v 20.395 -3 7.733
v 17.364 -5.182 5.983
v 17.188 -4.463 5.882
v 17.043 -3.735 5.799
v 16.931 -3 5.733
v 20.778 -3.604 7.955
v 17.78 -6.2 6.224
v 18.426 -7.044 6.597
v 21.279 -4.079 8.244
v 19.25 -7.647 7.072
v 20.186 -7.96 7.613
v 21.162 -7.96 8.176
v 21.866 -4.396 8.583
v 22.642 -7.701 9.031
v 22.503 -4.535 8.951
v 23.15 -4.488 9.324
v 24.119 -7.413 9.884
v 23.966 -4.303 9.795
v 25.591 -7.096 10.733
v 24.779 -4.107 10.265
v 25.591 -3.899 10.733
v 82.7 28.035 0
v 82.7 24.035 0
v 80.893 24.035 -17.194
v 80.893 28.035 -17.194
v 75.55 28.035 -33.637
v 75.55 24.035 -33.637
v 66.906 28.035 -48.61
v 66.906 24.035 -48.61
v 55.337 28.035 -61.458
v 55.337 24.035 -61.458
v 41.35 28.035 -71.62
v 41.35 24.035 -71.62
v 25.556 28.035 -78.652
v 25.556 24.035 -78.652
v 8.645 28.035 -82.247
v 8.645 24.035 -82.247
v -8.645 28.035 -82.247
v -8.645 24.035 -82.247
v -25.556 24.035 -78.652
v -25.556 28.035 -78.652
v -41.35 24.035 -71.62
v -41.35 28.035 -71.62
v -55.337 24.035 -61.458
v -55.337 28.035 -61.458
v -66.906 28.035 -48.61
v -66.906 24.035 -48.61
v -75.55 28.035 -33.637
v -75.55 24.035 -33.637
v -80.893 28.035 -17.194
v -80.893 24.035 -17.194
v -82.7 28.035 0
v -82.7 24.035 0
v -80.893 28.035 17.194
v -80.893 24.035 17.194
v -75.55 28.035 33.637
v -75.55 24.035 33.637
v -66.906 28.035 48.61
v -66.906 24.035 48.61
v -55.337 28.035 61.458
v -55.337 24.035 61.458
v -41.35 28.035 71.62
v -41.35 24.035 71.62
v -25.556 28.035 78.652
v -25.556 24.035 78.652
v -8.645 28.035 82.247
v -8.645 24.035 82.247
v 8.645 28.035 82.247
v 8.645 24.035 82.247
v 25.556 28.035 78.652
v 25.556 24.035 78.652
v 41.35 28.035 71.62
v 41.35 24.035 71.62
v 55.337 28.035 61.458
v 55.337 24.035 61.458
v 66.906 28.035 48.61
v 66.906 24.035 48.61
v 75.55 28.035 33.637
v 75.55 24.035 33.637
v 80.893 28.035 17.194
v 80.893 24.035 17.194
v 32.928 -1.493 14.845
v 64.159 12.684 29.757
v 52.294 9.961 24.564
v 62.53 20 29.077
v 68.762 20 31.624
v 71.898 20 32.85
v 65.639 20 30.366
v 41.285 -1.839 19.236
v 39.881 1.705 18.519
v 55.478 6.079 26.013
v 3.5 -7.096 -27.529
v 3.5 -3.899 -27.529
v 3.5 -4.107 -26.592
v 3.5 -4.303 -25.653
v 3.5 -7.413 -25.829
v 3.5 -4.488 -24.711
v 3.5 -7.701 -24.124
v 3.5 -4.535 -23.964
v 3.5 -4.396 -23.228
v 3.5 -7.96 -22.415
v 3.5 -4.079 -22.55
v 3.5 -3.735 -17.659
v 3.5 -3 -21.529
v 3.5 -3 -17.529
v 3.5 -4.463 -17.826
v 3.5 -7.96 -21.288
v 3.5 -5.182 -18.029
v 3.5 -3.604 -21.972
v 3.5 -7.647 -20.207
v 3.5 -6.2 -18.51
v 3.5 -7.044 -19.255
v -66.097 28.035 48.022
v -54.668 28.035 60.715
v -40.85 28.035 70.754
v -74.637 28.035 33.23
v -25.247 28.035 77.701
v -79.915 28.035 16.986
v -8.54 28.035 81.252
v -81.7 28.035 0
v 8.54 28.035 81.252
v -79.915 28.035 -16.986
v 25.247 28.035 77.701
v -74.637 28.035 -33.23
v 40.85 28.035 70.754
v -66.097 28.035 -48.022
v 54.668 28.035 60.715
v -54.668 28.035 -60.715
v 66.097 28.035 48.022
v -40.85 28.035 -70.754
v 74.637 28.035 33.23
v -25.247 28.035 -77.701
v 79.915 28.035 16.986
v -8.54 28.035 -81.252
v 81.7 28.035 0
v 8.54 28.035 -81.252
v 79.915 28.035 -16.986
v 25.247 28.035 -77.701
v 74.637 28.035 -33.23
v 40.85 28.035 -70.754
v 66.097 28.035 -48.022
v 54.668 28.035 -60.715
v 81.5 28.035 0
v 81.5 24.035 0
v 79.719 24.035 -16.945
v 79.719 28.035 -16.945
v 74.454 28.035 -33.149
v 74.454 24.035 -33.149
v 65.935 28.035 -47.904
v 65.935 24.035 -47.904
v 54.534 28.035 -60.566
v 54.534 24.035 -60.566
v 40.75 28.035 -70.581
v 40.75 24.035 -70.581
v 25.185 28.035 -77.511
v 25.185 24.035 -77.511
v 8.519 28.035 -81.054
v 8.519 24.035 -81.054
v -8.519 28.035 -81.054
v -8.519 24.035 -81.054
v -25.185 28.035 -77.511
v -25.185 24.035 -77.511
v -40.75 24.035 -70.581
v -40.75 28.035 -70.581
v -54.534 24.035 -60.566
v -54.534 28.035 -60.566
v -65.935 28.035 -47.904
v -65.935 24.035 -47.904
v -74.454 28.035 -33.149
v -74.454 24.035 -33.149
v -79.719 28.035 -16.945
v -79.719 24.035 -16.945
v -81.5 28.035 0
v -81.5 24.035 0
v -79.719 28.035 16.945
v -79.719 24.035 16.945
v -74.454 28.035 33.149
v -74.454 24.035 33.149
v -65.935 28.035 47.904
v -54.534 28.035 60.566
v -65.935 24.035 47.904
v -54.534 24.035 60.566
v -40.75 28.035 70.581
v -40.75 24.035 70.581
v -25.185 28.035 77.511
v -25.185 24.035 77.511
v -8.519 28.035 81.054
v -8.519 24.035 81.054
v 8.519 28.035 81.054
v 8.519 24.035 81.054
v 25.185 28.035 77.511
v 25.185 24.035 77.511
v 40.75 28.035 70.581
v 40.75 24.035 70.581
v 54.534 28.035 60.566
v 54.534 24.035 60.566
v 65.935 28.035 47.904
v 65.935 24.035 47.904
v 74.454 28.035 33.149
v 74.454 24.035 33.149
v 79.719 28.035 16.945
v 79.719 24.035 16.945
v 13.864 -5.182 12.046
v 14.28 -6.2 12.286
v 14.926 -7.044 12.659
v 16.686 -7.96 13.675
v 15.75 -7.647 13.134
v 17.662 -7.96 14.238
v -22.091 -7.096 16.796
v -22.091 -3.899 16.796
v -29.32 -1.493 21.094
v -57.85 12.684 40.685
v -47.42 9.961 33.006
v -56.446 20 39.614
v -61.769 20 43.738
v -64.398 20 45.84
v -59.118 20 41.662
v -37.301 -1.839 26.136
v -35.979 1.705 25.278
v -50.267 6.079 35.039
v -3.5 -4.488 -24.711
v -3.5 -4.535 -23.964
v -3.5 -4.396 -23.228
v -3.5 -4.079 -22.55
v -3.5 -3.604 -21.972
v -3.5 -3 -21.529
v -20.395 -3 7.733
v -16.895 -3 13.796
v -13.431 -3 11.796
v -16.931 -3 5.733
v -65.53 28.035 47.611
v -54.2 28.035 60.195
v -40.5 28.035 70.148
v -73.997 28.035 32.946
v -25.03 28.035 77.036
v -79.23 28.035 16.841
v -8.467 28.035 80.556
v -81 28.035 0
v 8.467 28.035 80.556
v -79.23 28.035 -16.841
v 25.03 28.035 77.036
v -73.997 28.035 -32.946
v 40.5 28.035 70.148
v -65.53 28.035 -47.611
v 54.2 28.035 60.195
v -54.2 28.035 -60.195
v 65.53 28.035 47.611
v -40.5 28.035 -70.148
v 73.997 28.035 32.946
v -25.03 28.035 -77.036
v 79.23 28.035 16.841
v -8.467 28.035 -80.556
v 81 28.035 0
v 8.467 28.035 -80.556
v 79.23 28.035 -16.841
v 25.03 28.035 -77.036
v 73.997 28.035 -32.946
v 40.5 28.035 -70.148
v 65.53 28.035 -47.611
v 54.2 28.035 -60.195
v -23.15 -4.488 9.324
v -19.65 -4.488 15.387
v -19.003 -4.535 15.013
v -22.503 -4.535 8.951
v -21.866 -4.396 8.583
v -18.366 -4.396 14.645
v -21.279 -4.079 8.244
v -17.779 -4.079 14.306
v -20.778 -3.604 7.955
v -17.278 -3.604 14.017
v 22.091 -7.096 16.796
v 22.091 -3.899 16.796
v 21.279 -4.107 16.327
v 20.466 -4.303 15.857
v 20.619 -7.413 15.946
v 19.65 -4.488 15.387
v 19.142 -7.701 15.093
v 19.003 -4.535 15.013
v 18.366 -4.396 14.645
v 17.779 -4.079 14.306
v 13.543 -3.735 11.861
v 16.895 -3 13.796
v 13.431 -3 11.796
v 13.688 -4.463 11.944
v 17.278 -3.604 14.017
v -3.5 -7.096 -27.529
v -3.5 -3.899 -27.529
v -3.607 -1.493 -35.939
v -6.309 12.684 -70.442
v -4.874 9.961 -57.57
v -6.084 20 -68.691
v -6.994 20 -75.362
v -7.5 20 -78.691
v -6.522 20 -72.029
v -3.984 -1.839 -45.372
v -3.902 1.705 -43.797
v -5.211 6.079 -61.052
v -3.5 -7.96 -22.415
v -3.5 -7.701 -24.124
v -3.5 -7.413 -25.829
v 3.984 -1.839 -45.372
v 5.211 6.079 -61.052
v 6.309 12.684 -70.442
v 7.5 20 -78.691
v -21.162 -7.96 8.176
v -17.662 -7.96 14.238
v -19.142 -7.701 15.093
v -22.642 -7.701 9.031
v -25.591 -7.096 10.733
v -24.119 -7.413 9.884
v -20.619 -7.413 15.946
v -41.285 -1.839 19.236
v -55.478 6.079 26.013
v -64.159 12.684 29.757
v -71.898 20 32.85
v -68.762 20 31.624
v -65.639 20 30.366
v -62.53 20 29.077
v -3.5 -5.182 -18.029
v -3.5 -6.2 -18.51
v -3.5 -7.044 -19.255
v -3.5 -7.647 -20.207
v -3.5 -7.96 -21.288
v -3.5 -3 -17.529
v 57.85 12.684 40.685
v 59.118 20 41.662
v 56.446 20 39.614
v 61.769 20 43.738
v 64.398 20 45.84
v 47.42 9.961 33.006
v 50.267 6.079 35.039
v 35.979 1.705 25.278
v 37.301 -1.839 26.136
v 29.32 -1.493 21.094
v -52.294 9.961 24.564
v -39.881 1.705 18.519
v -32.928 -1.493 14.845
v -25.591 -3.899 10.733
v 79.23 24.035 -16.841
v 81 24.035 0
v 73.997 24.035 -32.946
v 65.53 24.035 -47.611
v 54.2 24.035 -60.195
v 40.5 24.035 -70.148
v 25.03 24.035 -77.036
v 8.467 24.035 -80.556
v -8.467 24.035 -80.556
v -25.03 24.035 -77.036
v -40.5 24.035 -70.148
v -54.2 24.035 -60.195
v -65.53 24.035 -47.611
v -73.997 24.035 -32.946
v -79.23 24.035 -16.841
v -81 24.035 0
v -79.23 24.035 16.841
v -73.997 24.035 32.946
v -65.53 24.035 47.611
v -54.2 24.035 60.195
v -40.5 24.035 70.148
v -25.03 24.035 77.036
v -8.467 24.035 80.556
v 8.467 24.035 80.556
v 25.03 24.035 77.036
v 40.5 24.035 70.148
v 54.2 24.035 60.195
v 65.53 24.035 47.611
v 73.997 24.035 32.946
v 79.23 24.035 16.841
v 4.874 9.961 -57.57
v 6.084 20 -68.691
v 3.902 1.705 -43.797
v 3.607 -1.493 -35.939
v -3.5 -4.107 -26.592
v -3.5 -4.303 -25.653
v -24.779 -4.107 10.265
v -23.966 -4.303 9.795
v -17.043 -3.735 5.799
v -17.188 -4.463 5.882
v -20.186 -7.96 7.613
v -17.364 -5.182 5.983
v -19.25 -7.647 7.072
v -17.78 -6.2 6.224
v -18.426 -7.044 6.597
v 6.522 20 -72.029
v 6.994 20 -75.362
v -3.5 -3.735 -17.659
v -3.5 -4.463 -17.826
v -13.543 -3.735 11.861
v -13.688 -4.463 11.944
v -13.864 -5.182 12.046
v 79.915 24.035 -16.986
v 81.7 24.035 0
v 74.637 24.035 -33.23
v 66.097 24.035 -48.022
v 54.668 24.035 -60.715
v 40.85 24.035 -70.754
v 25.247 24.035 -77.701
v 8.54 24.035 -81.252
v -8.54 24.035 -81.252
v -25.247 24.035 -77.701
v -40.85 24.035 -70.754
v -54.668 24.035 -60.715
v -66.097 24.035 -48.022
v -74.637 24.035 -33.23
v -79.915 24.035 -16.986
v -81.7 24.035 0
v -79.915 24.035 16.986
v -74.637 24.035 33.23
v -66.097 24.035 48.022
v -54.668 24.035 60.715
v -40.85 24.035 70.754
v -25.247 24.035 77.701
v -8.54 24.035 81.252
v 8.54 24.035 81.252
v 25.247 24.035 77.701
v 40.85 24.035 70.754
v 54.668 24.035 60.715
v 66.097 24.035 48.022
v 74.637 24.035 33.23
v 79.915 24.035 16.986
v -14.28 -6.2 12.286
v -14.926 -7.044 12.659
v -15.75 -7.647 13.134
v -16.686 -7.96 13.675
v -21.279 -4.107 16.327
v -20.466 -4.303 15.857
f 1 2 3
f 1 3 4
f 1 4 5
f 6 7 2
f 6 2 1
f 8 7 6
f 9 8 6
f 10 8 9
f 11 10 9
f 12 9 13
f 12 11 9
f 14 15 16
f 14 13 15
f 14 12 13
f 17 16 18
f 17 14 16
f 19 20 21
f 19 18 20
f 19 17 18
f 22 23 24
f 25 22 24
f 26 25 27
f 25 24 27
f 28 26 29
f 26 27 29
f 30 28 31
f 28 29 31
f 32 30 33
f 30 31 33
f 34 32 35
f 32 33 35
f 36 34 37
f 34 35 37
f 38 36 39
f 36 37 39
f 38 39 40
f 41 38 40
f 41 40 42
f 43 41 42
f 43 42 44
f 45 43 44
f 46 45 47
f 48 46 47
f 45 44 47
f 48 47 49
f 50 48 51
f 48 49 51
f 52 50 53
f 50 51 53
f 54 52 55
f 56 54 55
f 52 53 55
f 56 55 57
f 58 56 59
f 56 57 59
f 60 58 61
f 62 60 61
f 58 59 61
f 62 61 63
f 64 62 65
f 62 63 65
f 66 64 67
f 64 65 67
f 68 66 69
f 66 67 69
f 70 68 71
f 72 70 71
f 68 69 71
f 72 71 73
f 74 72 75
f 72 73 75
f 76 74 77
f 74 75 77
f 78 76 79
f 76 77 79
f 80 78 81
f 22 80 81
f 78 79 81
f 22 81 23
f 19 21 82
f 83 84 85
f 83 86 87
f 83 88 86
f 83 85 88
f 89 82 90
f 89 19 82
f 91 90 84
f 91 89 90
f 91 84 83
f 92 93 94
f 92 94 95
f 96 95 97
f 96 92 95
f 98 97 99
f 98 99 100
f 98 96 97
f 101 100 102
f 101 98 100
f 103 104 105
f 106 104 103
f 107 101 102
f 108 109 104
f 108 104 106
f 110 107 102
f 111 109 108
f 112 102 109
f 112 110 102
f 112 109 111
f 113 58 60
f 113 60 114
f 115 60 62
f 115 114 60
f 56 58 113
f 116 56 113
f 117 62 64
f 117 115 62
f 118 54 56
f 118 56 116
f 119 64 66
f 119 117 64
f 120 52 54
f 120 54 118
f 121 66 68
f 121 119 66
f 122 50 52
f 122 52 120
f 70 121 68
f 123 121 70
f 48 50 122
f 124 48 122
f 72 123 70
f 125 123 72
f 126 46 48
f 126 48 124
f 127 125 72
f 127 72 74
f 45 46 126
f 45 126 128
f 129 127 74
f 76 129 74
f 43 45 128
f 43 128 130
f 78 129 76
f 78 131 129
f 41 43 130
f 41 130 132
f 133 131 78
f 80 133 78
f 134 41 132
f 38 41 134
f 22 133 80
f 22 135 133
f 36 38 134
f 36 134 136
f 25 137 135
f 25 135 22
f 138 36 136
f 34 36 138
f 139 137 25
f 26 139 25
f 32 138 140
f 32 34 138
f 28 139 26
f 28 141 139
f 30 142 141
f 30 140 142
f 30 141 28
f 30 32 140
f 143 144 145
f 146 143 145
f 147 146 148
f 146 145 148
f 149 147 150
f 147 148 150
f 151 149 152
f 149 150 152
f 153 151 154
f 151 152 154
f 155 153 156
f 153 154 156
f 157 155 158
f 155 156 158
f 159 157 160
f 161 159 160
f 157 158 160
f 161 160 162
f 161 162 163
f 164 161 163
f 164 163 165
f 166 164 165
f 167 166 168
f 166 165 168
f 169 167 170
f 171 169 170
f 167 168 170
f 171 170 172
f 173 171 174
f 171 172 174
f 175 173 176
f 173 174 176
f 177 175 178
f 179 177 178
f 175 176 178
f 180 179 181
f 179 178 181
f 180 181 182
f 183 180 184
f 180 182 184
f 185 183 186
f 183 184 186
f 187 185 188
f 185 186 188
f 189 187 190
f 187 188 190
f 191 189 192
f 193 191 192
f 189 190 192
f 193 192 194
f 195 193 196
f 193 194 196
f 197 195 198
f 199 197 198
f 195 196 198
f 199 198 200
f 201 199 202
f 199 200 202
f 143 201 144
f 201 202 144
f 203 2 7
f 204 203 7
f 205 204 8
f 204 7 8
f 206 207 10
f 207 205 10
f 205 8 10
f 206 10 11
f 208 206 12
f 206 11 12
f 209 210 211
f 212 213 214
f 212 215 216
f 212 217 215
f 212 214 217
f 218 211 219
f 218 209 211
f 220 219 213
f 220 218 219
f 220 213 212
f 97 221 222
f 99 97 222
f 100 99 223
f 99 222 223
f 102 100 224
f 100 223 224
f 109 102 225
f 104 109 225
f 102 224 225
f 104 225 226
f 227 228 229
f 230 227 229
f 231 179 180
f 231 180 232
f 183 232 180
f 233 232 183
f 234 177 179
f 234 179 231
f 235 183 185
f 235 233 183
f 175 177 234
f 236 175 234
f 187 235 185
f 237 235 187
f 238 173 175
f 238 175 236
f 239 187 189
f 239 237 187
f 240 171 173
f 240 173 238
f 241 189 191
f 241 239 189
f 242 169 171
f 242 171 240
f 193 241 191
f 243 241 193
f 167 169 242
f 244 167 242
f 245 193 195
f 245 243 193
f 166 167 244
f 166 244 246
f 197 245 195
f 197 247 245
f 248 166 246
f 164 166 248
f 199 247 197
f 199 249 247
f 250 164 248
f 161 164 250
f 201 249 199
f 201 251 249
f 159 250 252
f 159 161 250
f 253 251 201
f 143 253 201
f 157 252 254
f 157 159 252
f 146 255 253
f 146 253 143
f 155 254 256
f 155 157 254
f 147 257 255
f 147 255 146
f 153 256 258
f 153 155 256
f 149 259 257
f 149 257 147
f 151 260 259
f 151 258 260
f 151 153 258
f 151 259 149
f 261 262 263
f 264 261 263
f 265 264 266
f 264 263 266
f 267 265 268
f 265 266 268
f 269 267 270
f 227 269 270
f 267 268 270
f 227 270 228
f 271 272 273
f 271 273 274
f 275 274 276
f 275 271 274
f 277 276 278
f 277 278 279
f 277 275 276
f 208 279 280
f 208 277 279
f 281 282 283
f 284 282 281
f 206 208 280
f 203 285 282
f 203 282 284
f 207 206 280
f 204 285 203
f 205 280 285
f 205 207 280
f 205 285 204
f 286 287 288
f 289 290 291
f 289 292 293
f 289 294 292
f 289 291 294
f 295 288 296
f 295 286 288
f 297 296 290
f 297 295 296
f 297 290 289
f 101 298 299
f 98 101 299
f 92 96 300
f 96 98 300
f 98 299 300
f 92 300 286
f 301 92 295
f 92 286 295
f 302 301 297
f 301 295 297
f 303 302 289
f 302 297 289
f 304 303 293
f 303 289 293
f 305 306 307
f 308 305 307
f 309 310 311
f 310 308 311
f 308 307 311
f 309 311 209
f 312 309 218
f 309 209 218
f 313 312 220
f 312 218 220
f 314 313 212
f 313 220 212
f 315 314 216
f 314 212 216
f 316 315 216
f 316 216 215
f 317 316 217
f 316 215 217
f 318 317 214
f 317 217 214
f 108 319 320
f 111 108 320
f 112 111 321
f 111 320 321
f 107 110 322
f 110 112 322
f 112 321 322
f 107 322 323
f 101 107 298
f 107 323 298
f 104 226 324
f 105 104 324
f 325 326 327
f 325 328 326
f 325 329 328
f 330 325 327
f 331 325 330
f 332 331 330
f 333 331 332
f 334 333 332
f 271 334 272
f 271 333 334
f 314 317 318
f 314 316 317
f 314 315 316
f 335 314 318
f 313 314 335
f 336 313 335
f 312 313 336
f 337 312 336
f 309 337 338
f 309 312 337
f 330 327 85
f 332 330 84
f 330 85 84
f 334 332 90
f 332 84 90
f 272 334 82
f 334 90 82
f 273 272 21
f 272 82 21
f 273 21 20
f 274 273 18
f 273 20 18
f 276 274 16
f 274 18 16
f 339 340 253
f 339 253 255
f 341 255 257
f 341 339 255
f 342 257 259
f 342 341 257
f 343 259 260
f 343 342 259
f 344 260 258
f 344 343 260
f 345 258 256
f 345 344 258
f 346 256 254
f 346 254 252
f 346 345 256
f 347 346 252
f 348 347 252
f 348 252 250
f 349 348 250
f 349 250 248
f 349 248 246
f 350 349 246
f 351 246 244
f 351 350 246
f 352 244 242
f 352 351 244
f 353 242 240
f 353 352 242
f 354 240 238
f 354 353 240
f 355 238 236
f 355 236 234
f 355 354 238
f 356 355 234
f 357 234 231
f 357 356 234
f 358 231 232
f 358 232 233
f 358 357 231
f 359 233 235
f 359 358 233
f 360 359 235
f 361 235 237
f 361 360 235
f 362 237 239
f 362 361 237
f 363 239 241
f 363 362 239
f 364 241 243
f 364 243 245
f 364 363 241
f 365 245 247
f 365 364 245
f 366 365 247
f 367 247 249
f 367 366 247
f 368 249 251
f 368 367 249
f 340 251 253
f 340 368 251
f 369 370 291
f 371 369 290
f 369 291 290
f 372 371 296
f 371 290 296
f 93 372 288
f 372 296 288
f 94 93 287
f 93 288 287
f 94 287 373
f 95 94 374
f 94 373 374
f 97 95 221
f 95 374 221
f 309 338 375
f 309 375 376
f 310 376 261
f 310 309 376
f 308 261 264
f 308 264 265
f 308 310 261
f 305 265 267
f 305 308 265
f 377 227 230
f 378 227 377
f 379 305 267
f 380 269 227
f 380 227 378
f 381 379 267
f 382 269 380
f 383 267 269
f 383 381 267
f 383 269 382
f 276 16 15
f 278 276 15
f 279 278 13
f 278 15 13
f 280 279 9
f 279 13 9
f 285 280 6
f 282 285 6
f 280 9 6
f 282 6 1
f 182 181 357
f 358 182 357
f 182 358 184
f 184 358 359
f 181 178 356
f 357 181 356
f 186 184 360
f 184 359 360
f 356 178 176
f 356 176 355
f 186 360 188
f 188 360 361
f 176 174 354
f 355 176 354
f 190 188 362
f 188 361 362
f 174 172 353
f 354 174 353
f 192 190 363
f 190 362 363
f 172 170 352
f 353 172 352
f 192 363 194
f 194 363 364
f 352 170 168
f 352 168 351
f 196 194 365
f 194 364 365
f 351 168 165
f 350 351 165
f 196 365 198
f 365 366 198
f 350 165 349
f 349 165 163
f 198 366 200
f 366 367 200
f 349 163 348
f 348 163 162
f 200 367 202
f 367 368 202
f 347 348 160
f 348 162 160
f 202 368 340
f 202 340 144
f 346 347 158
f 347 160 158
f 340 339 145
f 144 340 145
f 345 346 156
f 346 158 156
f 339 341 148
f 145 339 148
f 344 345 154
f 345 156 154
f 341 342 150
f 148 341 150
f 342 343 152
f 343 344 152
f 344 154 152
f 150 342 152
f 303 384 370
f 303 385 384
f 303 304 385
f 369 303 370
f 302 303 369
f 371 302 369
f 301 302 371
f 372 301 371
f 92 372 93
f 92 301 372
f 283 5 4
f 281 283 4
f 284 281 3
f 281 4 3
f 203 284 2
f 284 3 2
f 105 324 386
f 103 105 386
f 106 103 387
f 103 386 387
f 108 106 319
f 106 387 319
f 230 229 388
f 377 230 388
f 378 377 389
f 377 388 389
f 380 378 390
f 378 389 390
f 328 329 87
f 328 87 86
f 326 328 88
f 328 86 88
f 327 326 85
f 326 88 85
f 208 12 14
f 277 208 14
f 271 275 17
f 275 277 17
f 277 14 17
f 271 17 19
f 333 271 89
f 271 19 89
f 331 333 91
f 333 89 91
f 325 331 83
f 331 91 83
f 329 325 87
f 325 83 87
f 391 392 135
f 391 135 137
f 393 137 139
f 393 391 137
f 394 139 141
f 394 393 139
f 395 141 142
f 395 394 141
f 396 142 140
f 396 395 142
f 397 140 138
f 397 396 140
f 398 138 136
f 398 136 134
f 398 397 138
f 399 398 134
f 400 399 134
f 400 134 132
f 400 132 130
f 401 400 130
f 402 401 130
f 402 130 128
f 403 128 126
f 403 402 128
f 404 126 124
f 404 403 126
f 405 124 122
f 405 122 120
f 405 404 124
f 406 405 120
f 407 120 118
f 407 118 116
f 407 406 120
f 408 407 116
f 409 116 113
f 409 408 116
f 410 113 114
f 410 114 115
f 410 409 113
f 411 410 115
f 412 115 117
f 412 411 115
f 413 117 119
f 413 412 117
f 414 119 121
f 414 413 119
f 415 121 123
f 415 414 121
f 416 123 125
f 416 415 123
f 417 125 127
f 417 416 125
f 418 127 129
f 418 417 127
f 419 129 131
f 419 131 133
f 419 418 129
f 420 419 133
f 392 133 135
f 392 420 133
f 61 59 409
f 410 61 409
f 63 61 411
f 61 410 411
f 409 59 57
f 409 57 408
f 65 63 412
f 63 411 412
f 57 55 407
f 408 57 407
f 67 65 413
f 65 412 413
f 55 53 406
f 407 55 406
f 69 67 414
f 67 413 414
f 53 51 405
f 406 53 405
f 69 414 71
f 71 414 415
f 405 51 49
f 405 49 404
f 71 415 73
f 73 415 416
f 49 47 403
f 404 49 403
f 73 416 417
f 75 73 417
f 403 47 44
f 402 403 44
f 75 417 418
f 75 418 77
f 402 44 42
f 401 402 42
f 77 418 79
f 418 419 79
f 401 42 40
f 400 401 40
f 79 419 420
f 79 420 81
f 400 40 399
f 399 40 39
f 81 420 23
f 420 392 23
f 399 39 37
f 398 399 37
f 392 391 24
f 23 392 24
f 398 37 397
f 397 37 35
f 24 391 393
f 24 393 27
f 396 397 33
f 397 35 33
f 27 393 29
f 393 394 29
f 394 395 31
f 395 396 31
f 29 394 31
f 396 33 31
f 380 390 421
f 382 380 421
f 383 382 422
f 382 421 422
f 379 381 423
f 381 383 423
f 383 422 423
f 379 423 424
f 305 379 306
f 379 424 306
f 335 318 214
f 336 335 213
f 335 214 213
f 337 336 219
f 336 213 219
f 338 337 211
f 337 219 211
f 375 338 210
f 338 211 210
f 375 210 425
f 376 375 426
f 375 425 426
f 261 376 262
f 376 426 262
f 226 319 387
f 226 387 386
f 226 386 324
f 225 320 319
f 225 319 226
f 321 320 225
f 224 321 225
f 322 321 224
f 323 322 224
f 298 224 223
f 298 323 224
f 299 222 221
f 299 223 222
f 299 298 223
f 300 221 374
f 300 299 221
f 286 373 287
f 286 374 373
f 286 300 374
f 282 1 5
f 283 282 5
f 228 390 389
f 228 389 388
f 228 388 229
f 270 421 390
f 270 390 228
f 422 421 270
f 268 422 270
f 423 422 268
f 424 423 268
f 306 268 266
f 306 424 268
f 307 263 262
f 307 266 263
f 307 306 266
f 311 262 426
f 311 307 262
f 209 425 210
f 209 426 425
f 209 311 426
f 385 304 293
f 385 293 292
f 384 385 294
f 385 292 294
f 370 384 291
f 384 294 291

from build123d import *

# Parameters (mm, degrees)
BOSS_EXTRUDE1_START     = -7.5
BOSS_EXTRUDE1_DEPTH     = 15
CUT_EXTRUDE1_DEPTH      = 82.53809146
CUT_EXTRUDE1_DEPTH_BACK = 82.53809146
SKETCH19_OUTSIDE_W      = 30.784
SKETCH19_OUTSIDE_H      = 76.946
CIRPATTERN3_COUNT       = 3
THICKEN1_START          = 24.03491013
THICKEN1_OUTLINE_R      = 81.5
THICKEN1_OUTLINE_R_2    = 81
THICKEN1_DEPTH          = 4
THICKEN2_START          = 24.03491013
THICKEN2_OUTLINE_R      = 82.7
THICKEN2_OUTLINE_R_2    = 81.7
THICKEN2_DEPTH          = 4


with BuildPart() as part:
    # Boss-Extrude1: read off the stored shape, not the designer's step
    # Boss-Extrude1 outline → Boss-Extrude1 (new body)
    with BuildSketch(Plane(origin=(0, 0, 0), x_dir=(0, 0, -1), z_dir=(1, 0, 0)).offset(BOSS_EXTRUDE1_START)):
        with BuildLine():
            ThreePointArc((18.028980942, -5.181901708), (19.709835751, -7.379062069), (22.414512175, -7.960019885))
            ThreePointArc((22.414512175, -7.960019885), (52.80584115, 1.484725187), (78.690598923, 20))
            Line((78.690598923, 20), (68.690598923, 20))
            ThreePointArc((68.690598923, 20), (48.677007473, 4.206743456), (24.710969586, -4.488072412))
            ThreePointArc((24.710969586, -4.488072412), (22.879404453, -4.258455788), (21.528980942, -3))
            Line((21.528980942, -3), (17.528980942, -3))
            ThreePointArc((17.528980942, -3), (17.738223336, -4.100290781), (18.028980942, -5.181901708))
        make_face()
    extrude(amount=BOSS_EXTRUDE1_DEPTH)

    # Sketch19 outside → Cut-Extrude1 (cut, two sides: drawn at the far end of the back side and taken through both)
    with BuildSketch(Plane(origin=(0, 0, 0), x_dir=(1, 0, 0), z_dir=(0, 1, 0)).offset(-CUT_EXTRUDE1_DEPTH_BACK)):
        with Locations((0, 48.11)):
            Rectangle(SKETCH19_OUTSIDE_W, SKETCH19_OUTSIDE_H)
        with BuildLine():
            Line((-3.5, 17.528980942), (-3.5, 27.528980942))
            ThreePointArc((-3.5, 27.528980942), (-4.501523516, 53.187854429), (-7.5, 78.690598923))
            Line((-7.5, 78.690598923), (7.5, 78.690598923))
            ThreePointArc((7.5, 78.690598923), (4.501523516, 53.187854429), (3.5, 27.528980942))
            Line((3.5, 27.528980942), (3.5, 17.528980942))
            Line((3.5, 17.528980942), (-3.5, 17.528980942))
        make_face(mode=Mode.SUBTRACT)
    extrude(amount=CUT_EXTRUDE1_DEPTH + CUT_EXTRUDE1_DEPTH_BACK, mode=Mode.SUBTRACT)


with BuildPart() as cirpattern3_1:
    # CirPattern3: pattern copy
    add(part.part.rotate(Axis((0, 0, 0), (0, 1, 0)), 1 * 360 / CIRPATTERN3_COUNT))


with BuildPart() as cirpattern3_2:
    # CirPattern3: pattern copy
    add(part.part.rotate(Axis((0, 0, 0), (0, 1, 0)), 2 * 360 / CIRPATTERN3_COUNT))


with BuildPart() as body_4:
    # Thicken1: read off the stored shape, not the designer's step
    # Thicken1 outline → Thicken1 (new body)
    with BuildSketch(Plane(origin=(0, 0, 0), x_dir=(1, 0, 0), z_dir=(0, 1, 0)).offset(THICKEN1_START)):
        Circle(THICKEN1_OUTLINE_R)
        Circle(THICKEN1_OUTLINE_R_2, mode=Mode.SUBTRACT)
    extrude(amount=THICKEN1_DEPTH)


with BuildPart() as body_5:
    # Thicken2: read off the stored shape, not the designer's step
    # Thicken2 outline → Thicken2 (new body)
    with BuildSketch(Plane(origin=(0, 0, 0), x_dir=(1, 0, 0), z_dir=(0, 1, 0)).offset(THICKEN2_START)):
        Circle(THICKEN2_OUTLINE_R)
        Circle(THICKEN2_OUTLINE_R_2, mode=Mode.SUBTRACT)
    extrude(amount=THICKEN2_DEPTH)


solid = Compound([part.part, cirpattern3_1.part, cirpattern3_2.part, body_4.part, body_5.part])
